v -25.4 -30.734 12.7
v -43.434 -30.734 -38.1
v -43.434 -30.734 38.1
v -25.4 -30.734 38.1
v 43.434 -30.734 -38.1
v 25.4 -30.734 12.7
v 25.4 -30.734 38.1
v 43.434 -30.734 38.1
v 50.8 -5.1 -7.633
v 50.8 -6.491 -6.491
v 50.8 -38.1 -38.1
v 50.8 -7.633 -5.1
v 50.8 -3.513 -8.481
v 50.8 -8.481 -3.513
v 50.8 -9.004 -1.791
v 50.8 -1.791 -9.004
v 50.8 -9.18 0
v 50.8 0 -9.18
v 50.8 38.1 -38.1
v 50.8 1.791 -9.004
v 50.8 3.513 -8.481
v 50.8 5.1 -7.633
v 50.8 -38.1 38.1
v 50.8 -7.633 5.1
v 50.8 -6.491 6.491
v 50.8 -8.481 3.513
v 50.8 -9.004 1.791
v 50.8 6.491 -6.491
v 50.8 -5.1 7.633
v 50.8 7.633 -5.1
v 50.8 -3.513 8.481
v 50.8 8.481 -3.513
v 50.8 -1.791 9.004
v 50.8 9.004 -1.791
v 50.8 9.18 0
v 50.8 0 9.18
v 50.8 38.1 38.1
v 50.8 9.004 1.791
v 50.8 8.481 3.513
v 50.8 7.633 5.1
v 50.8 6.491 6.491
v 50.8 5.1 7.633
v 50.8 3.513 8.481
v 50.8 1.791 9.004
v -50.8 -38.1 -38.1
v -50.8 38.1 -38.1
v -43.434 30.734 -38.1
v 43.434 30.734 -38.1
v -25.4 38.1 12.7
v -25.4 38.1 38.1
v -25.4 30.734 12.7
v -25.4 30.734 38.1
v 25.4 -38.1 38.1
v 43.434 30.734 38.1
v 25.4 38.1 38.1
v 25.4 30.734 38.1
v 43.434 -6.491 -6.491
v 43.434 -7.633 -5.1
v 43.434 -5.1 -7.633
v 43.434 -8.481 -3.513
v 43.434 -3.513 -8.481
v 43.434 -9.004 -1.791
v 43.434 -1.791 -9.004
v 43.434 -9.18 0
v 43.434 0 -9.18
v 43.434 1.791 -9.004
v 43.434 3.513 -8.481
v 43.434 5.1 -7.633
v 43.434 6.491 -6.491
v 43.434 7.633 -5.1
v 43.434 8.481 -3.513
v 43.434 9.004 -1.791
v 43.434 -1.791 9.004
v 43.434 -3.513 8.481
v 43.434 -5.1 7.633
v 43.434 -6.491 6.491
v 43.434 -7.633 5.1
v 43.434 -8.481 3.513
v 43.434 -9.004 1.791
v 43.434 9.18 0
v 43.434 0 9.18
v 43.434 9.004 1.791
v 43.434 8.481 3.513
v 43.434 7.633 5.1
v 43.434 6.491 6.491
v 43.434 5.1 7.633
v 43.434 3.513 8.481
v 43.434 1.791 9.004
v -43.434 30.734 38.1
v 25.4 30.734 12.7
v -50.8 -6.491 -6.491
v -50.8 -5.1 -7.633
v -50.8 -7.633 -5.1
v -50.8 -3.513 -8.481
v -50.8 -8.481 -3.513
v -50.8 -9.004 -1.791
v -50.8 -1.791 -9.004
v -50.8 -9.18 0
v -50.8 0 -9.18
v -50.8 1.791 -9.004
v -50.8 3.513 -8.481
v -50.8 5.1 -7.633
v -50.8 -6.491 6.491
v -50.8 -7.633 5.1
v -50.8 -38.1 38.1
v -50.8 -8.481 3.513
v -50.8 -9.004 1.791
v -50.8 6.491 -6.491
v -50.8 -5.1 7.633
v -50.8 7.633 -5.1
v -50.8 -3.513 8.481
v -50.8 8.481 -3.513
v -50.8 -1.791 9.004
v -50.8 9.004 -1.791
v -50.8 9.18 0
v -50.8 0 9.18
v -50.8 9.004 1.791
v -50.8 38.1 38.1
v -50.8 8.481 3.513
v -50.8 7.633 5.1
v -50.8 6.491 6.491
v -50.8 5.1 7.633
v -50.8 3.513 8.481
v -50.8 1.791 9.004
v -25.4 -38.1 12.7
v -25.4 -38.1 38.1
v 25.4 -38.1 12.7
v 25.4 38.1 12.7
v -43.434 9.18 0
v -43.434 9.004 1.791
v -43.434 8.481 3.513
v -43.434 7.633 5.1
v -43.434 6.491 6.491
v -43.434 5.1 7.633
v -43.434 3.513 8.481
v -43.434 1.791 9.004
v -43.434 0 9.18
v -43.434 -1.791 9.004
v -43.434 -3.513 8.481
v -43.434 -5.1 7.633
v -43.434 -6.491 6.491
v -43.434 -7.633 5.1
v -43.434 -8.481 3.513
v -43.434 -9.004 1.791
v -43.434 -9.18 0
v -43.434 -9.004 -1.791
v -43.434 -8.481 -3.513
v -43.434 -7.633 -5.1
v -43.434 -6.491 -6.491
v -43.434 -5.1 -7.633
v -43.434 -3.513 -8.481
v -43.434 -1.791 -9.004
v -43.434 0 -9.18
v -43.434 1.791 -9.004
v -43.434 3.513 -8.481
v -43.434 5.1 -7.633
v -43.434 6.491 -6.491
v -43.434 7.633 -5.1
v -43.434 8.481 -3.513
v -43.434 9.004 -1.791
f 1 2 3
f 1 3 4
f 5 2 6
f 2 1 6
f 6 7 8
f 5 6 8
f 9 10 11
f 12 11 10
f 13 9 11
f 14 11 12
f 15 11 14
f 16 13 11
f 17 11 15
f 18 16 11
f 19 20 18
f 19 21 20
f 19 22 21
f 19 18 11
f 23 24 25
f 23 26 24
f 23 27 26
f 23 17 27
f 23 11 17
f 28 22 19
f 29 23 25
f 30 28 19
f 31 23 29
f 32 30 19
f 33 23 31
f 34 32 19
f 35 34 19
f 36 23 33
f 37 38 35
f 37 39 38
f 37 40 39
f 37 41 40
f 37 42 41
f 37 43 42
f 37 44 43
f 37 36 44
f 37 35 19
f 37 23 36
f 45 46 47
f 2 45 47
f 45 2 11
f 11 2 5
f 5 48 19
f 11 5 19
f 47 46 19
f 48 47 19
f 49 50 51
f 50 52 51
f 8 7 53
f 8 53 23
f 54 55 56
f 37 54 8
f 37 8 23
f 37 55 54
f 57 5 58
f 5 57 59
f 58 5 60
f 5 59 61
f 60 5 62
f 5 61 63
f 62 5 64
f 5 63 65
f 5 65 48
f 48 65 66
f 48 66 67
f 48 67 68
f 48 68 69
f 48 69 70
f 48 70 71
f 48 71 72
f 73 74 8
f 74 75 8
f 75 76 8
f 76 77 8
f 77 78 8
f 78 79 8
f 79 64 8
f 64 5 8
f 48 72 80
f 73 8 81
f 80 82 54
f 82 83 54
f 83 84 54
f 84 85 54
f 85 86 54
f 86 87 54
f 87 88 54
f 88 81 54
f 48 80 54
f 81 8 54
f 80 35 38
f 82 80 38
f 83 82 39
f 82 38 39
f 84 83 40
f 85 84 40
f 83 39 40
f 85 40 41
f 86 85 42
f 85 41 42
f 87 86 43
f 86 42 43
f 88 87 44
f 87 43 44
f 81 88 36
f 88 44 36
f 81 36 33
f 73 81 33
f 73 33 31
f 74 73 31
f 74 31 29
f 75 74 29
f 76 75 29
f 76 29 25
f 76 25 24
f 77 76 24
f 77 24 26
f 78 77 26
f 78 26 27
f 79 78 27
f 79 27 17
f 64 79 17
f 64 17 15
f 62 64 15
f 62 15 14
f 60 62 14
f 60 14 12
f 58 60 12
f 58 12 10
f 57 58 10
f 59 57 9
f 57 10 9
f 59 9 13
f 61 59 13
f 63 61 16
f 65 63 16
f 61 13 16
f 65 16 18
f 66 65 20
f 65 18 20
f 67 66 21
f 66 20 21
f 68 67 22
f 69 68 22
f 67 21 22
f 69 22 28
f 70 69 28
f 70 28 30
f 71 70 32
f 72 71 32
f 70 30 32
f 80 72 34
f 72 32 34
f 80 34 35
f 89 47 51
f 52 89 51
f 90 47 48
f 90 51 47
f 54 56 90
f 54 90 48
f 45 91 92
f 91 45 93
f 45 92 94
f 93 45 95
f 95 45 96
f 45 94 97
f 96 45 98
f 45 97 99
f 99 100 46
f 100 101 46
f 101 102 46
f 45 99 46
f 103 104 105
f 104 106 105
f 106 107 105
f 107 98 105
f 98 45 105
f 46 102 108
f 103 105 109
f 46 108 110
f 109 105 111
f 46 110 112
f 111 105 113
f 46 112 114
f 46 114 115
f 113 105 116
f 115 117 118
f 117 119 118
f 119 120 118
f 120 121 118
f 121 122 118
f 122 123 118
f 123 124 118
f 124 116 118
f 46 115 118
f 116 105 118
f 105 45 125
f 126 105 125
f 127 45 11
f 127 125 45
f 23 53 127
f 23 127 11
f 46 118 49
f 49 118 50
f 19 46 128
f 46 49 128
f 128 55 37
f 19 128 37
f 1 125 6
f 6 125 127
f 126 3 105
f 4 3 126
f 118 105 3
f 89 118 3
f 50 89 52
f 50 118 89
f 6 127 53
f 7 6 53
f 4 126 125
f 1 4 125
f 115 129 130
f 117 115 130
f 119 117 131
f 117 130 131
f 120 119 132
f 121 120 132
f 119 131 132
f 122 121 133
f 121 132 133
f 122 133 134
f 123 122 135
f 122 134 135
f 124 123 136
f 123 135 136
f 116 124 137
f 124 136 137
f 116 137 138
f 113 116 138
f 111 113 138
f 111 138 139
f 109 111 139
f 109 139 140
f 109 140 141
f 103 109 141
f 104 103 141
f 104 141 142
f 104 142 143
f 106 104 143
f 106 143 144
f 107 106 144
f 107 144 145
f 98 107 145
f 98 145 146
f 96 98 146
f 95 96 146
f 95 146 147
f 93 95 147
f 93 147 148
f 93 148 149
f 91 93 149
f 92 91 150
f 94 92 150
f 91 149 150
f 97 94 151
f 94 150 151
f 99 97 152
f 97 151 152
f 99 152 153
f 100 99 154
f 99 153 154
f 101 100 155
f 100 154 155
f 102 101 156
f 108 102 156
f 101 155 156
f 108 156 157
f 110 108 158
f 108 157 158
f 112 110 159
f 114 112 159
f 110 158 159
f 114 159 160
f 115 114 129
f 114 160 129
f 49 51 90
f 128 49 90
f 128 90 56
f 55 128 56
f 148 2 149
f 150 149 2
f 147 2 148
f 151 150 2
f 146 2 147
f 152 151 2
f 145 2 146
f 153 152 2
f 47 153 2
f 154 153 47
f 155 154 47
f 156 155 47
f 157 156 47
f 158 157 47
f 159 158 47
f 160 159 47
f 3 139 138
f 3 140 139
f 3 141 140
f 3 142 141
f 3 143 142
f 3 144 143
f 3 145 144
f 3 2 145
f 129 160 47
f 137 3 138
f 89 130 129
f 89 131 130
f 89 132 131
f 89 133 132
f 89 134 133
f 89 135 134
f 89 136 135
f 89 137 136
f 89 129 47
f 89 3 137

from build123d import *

# Parameters (mm, degrees)
F0_W     = 101.6
F0_H     = 76.2
F1_DEPTH = 38.1
F2_W     = 86.868002
F2_H     = 61.468002
F3_DEPTH = 76.201
F4_W     = 50.8
F4_H     = 25.4
F4_H_2   = 25.714025
F5_DEPTH = 76.201
F6_R     = 9.179985
F7_DEPTH = 101.601


with BuildPart() as f1:
    # F0 (on Top) → F1 (new body, symmetric)
    with BuildSketch(Plane.XY):
        Rectangle(F0_W, F0_H)
    extrude(amount=F1_DEPTH, both=True)

    # F2 (on face) → F3 (cut, through all)
    with BuildSketch(Plane.XY.offset(38.1)):
        Rectangle(F2_W, F2_H)
    extrude(amount=-F3_DEPTH, mode=Mode.SUBTRACT)

    # F4 (on face) → F5 (cut, through all)
    with BuildSketch(Plane.XZ.offset(38.1)):
        with Locations((0, 25.4)):
            Rectangle(F4_W, F4_H)
        with Locations((0, 50.957012)):
            Rectangle(F4_W, F4_H_2)
    extrude(amount=-F5_DEPTH, mode=Mode.SUBTRACT)

    # F6 (on face) → F7 (cut, through all)
    with BuildSketch(Plane.YZ.offset(50.8)):
        Circle(F6_R)
    extrude(amount=-F7_DEPTH, mode=Mode.SUBTRACT)


solid = f1.part
